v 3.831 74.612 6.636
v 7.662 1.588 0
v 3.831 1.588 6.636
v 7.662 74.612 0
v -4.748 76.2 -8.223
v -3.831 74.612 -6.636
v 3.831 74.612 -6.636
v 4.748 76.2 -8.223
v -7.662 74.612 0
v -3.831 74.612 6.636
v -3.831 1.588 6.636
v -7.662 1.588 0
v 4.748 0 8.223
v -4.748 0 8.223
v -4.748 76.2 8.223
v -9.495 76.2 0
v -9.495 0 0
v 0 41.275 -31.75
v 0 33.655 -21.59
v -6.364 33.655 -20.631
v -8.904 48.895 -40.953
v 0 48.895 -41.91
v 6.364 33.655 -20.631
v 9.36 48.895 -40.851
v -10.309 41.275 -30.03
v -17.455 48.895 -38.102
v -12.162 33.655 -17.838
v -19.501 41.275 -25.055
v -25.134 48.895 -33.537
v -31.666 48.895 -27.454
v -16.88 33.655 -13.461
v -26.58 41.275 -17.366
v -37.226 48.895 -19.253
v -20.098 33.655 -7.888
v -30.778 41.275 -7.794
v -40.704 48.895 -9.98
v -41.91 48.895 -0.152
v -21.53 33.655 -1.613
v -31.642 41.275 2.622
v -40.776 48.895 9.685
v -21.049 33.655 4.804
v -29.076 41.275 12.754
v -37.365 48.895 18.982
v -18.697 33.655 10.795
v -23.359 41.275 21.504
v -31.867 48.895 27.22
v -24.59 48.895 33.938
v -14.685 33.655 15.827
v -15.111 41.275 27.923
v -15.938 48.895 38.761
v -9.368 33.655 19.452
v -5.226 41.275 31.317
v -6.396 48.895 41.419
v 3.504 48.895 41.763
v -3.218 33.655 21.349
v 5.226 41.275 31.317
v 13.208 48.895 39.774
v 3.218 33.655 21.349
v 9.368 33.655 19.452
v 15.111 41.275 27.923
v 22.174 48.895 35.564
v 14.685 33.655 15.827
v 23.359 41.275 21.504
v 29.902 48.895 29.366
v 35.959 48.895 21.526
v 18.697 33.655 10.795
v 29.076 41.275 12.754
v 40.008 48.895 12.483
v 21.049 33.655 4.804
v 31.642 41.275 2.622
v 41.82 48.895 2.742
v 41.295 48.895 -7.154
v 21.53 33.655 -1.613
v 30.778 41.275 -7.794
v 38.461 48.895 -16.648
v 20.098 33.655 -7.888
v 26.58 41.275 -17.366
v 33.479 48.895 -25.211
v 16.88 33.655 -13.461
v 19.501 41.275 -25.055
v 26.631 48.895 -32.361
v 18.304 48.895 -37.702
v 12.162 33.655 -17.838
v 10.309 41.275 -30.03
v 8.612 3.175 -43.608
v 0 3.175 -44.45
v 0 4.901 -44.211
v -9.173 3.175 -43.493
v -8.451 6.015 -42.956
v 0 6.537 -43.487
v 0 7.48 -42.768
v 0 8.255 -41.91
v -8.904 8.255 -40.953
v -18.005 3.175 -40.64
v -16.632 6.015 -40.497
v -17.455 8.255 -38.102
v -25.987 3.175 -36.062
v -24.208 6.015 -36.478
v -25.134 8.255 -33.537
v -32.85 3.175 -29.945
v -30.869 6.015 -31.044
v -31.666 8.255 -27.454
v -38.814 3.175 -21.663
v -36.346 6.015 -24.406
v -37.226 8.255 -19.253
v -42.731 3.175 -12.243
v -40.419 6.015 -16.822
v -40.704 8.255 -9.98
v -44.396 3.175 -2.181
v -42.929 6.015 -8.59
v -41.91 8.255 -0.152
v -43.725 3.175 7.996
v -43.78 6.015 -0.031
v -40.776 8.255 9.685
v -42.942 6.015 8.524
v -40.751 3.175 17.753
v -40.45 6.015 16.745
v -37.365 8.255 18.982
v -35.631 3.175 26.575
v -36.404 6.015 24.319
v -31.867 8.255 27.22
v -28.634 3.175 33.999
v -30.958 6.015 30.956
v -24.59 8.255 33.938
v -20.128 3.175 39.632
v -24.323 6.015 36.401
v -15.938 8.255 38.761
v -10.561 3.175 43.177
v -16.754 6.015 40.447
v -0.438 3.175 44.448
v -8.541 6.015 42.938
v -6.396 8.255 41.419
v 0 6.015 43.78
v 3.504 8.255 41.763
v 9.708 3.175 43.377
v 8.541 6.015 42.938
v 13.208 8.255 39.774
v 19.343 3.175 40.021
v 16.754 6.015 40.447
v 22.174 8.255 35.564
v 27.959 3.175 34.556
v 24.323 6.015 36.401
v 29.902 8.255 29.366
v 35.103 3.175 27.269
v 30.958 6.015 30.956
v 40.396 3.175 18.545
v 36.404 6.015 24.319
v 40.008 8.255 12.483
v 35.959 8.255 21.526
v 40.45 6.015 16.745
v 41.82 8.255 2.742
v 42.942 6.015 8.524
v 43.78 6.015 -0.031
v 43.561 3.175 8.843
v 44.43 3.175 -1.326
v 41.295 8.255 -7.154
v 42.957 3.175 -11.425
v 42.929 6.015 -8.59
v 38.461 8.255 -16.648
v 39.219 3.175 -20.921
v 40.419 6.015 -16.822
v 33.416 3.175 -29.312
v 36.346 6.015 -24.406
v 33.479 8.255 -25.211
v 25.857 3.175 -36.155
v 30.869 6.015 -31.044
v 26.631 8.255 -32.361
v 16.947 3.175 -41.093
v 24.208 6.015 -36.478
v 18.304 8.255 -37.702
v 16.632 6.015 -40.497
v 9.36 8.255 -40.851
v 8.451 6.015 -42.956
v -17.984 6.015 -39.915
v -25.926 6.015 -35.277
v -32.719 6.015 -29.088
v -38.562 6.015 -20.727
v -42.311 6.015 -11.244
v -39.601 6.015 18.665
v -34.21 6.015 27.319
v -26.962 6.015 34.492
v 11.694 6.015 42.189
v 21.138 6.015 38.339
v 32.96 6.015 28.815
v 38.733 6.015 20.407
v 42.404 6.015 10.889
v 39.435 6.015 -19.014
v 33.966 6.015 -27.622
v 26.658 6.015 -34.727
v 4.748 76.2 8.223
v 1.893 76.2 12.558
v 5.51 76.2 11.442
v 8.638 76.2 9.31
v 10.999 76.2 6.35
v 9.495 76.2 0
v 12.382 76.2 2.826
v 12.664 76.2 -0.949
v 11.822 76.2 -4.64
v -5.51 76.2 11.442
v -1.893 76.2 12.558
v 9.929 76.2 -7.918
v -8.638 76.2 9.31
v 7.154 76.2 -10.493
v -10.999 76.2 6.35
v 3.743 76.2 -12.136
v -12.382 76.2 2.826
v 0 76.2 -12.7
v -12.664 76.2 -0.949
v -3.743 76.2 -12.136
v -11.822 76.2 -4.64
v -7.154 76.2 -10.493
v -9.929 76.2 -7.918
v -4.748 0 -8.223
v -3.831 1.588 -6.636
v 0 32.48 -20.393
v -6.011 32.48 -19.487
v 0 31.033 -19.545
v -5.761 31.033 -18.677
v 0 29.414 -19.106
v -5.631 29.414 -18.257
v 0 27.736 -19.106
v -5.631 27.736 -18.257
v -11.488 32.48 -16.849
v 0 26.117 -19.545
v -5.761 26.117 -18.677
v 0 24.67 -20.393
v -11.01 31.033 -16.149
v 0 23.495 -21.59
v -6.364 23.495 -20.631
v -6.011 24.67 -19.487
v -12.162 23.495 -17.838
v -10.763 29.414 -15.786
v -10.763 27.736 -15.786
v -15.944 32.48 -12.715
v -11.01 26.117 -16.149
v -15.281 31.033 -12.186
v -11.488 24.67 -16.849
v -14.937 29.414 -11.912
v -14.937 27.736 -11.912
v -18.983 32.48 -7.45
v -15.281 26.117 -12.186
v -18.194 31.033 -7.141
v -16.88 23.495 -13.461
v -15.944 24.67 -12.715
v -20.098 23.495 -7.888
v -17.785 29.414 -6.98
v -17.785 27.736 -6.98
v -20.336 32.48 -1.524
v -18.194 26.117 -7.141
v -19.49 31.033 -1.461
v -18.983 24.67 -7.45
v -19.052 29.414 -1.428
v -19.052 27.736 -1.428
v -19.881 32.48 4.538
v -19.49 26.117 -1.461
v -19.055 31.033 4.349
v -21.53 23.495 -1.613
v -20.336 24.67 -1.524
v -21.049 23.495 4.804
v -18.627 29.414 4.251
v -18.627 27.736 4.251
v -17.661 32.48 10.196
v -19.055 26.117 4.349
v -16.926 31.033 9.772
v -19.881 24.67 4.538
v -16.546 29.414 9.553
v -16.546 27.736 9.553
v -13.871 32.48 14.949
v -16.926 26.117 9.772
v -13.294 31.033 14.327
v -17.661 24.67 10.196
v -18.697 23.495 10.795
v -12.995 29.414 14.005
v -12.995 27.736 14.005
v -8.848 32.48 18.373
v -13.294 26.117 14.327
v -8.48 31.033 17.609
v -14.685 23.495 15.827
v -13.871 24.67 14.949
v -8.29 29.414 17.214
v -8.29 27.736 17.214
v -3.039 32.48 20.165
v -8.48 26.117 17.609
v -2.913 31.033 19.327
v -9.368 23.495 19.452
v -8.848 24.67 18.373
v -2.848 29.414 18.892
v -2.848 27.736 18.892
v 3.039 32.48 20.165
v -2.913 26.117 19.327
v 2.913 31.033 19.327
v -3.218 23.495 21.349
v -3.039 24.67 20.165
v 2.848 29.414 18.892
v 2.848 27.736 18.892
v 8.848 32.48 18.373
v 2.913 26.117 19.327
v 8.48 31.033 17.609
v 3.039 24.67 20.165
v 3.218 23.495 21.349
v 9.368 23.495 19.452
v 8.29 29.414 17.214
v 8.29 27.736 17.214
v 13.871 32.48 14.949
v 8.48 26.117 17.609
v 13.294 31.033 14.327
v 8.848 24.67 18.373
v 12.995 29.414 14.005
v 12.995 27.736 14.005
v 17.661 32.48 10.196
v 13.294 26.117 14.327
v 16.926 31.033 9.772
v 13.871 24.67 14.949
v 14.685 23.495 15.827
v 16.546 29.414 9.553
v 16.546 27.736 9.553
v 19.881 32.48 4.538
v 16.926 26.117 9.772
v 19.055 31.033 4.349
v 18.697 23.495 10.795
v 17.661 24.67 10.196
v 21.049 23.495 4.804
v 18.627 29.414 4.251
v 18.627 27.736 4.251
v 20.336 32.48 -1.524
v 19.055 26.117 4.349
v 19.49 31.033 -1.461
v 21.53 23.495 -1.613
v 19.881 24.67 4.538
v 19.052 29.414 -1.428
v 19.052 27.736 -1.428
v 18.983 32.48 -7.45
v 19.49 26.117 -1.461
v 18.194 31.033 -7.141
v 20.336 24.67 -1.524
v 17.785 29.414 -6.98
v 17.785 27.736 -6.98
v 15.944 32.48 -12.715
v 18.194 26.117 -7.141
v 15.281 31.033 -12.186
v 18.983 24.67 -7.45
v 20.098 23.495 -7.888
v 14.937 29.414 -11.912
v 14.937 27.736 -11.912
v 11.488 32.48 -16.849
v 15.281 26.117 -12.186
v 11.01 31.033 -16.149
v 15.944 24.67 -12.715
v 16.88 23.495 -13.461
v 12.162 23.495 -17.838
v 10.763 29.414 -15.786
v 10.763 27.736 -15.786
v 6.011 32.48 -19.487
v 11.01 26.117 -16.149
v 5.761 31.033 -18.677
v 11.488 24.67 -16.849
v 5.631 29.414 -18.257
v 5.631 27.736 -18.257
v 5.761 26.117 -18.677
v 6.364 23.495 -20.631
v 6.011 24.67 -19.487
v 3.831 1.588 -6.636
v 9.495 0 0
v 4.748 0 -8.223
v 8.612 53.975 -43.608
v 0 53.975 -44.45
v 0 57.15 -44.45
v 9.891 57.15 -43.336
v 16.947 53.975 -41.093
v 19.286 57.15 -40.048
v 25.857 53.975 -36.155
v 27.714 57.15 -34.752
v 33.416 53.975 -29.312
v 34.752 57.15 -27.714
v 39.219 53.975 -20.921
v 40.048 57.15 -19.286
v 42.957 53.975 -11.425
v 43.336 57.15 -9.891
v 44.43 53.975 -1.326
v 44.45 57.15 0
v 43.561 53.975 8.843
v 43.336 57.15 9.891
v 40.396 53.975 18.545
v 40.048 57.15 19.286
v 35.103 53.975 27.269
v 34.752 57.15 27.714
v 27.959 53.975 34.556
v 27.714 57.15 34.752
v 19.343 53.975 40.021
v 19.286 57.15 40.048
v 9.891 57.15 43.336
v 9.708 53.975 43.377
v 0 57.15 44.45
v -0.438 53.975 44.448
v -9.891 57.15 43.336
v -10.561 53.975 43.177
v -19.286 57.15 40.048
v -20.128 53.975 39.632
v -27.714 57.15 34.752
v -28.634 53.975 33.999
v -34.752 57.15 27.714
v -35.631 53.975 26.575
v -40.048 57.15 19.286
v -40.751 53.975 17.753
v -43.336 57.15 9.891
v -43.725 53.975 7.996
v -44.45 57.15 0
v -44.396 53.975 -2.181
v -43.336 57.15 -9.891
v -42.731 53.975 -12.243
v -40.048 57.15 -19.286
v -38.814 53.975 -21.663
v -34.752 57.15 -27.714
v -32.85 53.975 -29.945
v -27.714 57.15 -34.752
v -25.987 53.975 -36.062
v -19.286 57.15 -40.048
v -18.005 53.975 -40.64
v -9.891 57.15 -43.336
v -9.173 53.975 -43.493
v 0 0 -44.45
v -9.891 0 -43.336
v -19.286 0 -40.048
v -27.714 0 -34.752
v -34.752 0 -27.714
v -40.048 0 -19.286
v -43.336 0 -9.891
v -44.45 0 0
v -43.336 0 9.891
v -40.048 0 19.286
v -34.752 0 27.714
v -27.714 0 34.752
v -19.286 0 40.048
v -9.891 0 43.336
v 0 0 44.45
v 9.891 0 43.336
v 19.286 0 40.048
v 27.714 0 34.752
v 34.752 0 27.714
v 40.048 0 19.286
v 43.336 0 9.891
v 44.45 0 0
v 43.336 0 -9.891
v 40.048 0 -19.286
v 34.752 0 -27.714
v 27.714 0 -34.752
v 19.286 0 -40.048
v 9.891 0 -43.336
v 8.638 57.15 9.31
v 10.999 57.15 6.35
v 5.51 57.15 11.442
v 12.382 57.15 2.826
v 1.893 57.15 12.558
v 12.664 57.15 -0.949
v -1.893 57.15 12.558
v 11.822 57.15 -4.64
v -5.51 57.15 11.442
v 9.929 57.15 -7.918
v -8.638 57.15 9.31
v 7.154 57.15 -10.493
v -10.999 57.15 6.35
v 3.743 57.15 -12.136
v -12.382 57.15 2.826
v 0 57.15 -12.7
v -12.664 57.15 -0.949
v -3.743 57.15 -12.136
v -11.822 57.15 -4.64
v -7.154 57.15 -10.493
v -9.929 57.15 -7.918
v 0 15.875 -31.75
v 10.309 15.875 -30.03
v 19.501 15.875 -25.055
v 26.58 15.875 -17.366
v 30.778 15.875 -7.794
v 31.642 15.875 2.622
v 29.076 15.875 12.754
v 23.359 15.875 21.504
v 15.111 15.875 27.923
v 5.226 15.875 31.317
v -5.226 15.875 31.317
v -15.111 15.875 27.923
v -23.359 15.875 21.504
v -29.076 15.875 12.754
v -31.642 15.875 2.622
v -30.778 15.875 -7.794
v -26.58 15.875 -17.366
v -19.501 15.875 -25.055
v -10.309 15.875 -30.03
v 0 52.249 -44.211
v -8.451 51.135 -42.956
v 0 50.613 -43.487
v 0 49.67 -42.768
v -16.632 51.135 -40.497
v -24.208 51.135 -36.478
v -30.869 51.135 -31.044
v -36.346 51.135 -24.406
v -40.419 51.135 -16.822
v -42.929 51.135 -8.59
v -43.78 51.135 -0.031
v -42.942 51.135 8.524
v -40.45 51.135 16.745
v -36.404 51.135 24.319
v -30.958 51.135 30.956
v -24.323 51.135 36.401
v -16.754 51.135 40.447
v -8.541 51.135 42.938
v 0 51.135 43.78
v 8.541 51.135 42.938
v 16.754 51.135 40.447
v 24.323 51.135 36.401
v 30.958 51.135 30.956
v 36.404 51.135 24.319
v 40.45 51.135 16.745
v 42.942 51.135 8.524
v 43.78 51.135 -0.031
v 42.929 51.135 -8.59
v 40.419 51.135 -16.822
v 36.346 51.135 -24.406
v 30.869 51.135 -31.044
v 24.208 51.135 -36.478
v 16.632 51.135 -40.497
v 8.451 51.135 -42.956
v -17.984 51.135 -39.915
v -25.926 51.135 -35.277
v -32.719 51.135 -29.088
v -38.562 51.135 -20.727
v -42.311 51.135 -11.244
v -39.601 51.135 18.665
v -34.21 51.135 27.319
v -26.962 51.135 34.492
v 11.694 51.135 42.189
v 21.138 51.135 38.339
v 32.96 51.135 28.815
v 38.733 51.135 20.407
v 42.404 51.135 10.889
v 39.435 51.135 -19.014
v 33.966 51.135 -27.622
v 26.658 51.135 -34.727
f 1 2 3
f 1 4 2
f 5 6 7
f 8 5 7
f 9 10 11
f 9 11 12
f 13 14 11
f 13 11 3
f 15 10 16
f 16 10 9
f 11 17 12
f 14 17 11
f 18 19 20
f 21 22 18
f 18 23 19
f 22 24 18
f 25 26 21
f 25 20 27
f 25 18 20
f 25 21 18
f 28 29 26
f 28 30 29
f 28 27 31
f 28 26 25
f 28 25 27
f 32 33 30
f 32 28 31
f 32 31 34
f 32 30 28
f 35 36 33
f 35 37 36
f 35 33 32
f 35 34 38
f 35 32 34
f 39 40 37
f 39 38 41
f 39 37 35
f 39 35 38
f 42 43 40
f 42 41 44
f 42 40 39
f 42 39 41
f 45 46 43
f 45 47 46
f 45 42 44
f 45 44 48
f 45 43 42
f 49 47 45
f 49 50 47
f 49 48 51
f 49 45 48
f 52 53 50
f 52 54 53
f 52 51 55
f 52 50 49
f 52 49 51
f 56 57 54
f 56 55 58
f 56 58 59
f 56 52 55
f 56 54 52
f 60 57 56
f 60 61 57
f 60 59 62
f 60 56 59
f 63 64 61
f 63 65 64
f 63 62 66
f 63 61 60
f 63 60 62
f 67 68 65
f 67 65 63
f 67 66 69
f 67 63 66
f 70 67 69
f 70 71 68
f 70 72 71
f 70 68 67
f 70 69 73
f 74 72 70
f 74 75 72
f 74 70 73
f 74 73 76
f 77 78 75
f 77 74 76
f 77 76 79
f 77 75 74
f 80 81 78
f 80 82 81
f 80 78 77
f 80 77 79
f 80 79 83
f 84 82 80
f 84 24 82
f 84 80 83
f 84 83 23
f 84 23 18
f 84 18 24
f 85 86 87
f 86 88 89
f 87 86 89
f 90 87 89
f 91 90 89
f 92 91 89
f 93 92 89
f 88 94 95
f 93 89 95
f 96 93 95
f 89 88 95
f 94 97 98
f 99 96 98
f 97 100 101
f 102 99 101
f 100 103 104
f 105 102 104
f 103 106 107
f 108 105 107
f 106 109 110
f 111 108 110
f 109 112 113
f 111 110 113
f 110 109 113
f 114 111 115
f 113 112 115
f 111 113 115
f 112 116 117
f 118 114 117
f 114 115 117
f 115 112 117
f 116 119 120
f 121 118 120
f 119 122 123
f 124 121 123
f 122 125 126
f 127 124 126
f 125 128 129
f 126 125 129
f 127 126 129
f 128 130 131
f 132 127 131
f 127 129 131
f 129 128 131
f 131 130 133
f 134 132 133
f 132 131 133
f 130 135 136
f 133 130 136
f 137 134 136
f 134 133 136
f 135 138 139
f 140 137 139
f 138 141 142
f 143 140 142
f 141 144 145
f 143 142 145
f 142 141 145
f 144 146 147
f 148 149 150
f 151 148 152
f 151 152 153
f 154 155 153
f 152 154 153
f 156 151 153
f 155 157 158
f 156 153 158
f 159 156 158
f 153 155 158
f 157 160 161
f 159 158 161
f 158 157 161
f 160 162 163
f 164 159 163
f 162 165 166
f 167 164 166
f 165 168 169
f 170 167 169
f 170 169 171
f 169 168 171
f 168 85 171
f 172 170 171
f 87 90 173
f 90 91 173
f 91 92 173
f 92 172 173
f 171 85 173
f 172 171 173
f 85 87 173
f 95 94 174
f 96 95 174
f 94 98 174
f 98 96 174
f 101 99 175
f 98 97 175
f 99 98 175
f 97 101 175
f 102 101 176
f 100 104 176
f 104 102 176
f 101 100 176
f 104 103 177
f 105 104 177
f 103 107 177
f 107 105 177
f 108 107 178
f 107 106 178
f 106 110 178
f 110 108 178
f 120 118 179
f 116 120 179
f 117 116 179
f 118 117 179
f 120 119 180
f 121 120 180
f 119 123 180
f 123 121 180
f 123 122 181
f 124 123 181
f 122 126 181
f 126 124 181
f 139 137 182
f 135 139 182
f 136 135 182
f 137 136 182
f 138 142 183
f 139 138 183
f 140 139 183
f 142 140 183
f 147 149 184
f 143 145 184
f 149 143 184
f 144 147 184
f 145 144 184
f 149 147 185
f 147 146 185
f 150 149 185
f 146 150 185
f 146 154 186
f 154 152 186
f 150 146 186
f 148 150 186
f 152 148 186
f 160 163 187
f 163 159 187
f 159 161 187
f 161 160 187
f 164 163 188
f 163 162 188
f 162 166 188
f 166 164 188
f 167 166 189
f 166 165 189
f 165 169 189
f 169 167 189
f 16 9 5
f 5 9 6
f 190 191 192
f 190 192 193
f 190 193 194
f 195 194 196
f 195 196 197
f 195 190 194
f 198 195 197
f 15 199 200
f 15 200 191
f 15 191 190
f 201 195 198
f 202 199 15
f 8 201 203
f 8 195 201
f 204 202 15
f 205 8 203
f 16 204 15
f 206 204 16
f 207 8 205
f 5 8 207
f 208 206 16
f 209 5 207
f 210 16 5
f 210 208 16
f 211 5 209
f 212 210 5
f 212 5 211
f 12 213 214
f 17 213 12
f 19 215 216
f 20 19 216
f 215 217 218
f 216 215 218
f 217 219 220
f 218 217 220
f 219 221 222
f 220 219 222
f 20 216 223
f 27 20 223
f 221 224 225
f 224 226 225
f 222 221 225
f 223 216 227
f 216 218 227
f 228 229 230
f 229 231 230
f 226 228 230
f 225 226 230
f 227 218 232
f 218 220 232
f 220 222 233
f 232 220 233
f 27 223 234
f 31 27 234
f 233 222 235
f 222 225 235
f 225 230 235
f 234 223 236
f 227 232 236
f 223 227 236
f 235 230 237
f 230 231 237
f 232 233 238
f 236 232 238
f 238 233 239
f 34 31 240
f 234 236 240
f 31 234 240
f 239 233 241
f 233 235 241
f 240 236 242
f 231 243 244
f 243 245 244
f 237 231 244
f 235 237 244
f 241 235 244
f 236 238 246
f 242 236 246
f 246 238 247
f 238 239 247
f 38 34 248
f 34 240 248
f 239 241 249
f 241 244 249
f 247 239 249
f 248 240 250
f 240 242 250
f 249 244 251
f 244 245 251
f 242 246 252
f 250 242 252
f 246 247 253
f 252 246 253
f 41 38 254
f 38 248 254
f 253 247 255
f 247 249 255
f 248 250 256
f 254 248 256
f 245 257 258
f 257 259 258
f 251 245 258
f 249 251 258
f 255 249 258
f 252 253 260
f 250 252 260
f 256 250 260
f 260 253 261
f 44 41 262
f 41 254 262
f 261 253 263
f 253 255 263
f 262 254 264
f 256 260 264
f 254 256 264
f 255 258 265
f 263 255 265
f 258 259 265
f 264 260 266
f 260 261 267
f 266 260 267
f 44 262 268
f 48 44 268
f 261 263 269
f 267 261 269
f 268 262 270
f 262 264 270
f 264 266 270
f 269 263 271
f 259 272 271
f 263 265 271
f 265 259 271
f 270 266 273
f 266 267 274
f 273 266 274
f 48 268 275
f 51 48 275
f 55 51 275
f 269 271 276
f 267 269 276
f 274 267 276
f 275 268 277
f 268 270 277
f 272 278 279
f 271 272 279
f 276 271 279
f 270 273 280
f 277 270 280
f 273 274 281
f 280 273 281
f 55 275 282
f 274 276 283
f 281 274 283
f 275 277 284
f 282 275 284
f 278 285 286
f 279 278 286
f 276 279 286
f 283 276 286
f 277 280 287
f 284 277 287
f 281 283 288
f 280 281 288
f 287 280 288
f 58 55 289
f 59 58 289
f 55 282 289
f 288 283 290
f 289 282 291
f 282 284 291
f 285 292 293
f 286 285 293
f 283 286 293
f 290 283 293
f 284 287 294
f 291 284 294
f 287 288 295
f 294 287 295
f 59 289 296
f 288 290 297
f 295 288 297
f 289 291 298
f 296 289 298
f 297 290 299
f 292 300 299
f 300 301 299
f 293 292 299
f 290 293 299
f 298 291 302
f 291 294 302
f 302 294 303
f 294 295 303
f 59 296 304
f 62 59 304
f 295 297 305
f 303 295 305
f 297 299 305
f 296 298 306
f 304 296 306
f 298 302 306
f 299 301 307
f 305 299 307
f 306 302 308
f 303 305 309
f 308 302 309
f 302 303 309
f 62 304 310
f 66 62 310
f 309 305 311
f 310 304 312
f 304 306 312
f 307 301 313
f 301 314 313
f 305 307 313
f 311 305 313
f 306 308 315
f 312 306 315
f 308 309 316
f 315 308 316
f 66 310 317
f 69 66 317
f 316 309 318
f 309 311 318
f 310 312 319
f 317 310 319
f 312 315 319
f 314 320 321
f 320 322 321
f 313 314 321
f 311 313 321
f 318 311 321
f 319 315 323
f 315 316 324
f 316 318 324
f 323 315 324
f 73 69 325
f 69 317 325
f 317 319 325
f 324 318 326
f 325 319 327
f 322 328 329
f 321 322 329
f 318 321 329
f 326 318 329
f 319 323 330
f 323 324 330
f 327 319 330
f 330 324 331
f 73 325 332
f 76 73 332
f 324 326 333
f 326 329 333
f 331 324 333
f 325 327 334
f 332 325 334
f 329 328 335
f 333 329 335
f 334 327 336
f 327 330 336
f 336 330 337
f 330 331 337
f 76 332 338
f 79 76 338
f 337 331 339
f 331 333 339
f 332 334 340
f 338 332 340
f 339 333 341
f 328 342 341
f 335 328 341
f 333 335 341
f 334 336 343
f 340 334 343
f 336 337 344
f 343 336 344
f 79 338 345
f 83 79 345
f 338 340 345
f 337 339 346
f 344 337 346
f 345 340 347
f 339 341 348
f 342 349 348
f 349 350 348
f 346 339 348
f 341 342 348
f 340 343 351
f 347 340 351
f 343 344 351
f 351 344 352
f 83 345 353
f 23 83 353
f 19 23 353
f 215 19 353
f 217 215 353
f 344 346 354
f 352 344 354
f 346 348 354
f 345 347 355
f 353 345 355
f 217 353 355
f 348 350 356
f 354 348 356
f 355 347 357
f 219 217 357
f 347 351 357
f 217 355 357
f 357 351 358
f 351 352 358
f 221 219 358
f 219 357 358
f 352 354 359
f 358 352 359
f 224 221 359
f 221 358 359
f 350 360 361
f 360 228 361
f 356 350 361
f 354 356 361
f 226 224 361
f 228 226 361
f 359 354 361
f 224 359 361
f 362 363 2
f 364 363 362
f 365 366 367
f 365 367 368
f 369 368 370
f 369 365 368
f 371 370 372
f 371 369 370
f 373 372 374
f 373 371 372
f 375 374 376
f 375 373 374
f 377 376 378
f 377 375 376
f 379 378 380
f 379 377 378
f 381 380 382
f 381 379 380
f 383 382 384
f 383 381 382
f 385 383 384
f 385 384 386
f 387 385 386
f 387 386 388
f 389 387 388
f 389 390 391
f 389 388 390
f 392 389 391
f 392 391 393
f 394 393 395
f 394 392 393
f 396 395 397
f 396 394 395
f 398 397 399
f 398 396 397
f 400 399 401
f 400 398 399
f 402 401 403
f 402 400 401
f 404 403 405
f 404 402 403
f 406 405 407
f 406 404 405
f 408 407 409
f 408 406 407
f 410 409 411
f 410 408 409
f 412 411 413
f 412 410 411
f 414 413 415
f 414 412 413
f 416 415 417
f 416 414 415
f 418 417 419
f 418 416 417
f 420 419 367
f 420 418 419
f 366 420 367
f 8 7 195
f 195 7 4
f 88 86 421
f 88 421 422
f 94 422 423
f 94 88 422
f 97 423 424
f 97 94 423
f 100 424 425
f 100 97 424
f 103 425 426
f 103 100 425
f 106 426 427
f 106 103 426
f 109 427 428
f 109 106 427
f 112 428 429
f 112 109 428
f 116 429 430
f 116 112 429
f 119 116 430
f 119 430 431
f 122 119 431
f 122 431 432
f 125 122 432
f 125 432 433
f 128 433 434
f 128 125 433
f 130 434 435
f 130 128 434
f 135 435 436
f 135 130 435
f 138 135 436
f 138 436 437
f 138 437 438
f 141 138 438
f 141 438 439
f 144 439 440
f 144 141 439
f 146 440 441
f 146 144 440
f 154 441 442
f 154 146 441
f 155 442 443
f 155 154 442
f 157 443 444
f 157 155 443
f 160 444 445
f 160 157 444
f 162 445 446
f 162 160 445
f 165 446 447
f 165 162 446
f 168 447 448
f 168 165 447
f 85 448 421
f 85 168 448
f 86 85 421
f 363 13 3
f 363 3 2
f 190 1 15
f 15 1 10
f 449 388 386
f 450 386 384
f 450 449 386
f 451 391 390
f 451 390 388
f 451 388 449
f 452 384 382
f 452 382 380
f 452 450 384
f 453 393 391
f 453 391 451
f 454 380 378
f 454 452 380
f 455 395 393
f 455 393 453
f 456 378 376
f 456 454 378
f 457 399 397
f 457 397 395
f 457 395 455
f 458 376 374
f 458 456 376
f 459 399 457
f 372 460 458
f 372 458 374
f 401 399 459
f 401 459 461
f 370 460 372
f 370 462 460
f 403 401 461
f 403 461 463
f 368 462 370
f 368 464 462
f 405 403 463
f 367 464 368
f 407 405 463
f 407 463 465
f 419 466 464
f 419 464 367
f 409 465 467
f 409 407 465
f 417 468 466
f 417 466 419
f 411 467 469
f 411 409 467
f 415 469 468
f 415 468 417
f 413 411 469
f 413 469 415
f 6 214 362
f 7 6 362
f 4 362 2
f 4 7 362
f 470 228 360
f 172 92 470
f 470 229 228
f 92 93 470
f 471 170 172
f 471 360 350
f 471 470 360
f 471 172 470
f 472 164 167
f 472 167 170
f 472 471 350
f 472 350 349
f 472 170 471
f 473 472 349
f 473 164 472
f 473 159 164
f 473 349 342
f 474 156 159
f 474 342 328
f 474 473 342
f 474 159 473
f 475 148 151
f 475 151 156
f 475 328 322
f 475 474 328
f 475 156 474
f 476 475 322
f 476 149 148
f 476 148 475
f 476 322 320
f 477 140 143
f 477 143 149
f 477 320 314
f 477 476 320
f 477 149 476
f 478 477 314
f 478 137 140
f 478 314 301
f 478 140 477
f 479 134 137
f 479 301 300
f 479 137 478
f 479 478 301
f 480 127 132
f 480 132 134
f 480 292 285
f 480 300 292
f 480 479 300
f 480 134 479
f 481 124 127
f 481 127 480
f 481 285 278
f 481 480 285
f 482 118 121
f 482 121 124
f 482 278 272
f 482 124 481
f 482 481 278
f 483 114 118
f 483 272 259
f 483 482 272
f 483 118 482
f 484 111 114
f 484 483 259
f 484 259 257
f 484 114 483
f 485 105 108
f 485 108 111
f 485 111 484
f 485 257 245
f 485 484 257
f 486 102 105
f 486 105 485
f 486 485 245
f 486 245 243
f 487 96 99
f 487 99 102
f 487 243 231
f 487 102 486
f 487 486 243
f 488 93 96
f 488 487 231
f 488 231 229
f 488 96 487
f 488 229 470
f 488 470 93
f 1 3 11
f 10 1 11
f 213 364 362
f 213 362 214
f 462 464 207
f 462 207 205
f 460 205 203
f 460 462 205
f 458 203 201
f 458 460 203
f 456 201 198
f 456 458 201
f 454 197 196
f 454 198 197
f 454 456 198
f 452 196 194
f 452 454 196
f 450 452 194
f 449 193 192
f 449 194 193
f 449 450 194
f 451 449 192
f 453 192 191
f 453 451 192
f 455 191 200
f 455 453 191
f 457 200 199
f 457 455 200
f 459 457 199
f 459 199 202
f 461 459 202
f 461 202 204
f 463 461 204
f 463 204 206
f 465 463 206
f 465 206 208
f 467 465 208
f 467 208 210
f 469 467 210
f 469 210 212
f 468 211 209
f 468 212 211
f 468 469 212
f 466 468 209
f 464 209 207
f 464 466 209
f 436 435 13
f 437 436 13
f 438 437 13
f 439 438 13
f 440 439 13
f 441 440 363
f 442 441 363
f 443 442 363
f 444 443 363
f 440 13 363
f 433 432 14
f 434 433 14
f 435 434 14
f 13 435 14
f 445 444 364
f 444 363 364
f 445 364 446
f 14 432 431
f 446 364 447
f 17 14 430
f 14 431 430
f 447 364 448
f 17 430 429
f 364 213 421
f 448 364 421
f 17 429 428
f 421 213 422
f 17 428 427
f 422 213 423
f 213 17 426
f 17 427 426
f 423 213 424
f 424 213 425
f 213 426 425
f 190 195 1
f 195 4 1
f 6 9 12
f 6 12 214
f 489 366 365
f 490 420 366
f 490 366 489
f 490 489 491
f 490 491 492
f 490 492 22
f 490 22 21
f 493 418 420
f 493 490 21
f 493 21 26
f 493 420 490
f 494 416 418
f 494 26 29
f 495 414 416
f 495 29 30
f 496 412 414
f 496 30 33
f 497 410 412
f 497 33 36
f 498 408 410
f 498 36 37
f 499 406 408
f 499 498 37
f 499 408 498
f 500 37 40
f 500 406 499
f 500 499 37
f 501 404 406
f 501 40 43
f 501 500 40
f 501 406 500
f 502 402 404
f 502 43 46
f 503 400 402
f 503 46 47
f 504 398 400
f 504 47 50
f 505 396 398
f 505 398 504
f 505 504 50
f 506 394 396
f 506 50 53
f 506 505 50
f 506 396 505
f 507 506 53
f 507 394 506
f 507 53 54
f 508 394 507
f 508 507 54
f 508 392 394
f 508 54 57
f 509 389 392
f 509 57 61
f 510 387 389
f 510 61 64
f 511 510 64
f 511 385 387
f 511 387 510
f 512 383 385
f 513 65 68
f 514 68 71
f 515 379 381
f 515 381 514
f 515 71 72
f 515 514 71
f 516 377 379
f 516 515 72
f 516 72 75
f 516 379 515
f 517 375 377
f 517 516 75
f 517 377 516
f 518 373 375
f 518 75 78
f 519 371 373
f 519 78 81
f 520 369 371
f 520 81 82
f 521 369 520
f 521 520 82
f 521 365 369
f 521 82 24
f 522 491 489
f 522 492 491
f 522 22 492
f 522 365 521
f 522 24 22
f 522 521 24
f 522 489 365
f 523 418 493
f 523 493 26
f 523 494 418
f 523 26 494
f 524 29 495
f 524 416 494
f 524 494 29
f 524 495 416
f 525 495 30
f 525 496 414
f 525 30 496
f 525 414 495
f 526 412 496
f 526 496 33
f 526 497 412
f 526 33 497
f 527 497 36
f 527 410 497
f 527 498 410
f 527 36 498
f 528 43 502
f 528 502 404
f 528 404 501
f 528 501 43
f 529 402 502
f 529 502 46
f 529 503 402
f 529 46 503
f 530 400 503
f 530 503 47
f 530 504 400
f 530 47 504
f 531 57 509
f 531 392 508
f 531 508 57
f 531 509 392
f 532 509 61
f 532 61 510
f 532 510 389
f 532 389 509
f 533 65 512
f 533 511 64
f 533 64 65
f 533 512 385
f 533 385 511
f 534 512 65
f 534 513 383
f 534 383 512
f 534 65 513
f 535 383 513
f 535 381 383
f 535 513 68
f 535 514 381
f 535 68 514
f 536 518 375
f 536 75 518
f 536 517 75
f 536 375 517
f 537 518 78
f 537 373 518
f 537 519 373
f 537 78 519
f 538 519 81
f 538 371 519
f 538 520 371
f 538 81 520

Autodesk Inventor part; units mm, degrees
ref_plane "YZ Plane" through (0, 0, 0) normal (1, 0, 0) x (0, 1, 0)
ref_plane "XZ Plane" through (0, 0, 0) normal (0, 1, 0) x (-1, 0, 0)
ref_plane "XY Plane" through (0, 0, 0) normal (0, 0, 1) x (1, 0, 0)
sketch "Sketch1" plane through (0, 0, 0) normal (1, 0, 0) x (0, 1, 0)
  line L0 (0, 0) -> (0, -44.45)
  line L1 (0, 0) -> (57.15, 0)
  line L2 (0, -44.45) -> (6.35, -44.45)
  line L3 (6.35, -44.45) -> (23.495, -21.59)
  line L4 (57.15, 0) -> (76.2, 0)
  line L5 (76.2, 0) -> (76.2, -12.7)
  line L6 (76.2, -12.7) -> (57.15, -12.7)
  line L7 (57.15, -12.7) -> (57.15, -44.45)
  line L8 (57.15, -44.45) -> (50.8, -44.45)
  line L9 (50.8, -44.45) -> (33.655, -21.59)
  arc A0 (33.655, -21.59) -> (23.495, -21.59) centre (28.575, -25.4) ccw
  point P0 (28.575, -14.8167)
  dimension "d36" = 44.45
  dimension "d37" = 57.15
  dimension "d38" = 6.35
  dimension "d40" = 28.575
  dimension "d41" = 19.05
  dimension "d42" = 12.7
  dimension "d43" = 44.45
  dimension "d44" = 57.15
  dimension "d48" = 6.35
  dimension "d53" = 19.05
revolve "Revolution1" add sketch "Sketch1" angle 360 about axis through (0, 0, 0) along (0, 1, 0)
sketch "Sketch6" plane through (0, 76.2, 0) normal (0, 1, 0) x (1, 0, 0)
  line L0 (7.6623, 0) -> (3.8312, -6.6357)
  line L1 (3.8312, -6.6357) -> (-3.8312, -6.6357)
  line L2 (-3.8312, -6.6357) -> (-7.6623, 0)
  line L3 (-7.6623, 0) -> (-3.8312, 6.6357)
  line L4 (-3.8312, 6.6357) -> (3.8312, 6.6358)
  line L5 (3.8312, 6.6358) -> (7.6623, 0)
  point P0 (0, 0)
  point P1 (0, 0)
  dimension "d45" = 13.2715
extrude "Extrusion5" cut sketch "Sketch6" against normal through all
chamfer "Chamfer4" distance 1.5875 angle 45 12 edges at (5.7467, 76.2, 3.3179) (5.7467, 76.2, -3.3179) (0, 76.2, -6.6358) (-5.7467, 76.2, -3.3179) (-5.7467, 76.2, 3.3179) (0, 76.2, 6.6357) (-5.7467, 0, -3.3179) (0, 0, -6.6358) (5.7467, 0, -3.3179) (5.7467, 0, 3.3179) (0, 0, 6.6357) (-5.7467, 0, 3.3179)
fillet "Fillet1" radius 6.35 2 edges at (0, 50.8, 44.45) (0, 6.35, 44.45)
equation "\"d36\" = spoolExteriorRadius"
equation "\"d37\" = spoolHeight"
equation "\"d38\" = supportChannels"
equation "\"d40\" = halfSpoolHeight"
equation "\"d41\" = spacerHeight"
equation "\"d43\" = spoolExteriorRadius"
equation "\"d44\" = spoolHeight"
equation "\"d53\" = spoolInteriroRadius"
equation "\"d45\" = hexDiameter"
equation "\"d49\" = hexHoleChamfer"
equation "\"holeForString\" = stringDiameter + clearanceForString"
equation "\"stringDiameter\" = 3"
equation "\"clearanceForString\" = 0.5"
equation "\"spoolHeight\" = 57.15"
equation "\"hexShaftDiameter\" = 12.7"
equation "\"clearanceForHexShaft\" = 0.5715"
equation "\"hexDiameter\" = hexShaftDiameter + clearanceForHexShaft"
equation "\"supportChannels\" = 6.35"
equation "\"spoolInteriorDiameter\" = 38.1"
equation "\"spoolInteriroRadius\" = 0.5 * spoolInteriorDiameter"
equation "\"spoolExteriorDiameter\" = 88.9"
equation "\"spoolExteriorRadius\" = 0.5 * spoolExteriorDiameter"
equation "\"spoolFiletRadius\" = 0.5 * supportChannels"
equation "\"holeCenter\" = 0.25 * spoolHeight - 0.75 * supportChannels"
equation "\"hexHoleChamfer\" = 1.5875"
equation "\"stringHoleCenterFromHexShaft\" = 0.5 * hexDiameter + 0.5 * holeForString"
equation "\"textCircleDiameter\" = 0.75 * spoolExteriorDiameter"
equation "\"textHeight\" = 6.096"
equation "\"textDepth\" = 1.27"
equation "\"stringHoleChamfer\" = 1.5875"
equation "\"halfSpoolHeight\" = 0.5 * spoolHeight"
equation "\"spoolTotalHeight\" = 76.2"
equation "\"spacerHeight\" = spoolTotalHeight - spoolHeight"
properties part number "spoolV02"
